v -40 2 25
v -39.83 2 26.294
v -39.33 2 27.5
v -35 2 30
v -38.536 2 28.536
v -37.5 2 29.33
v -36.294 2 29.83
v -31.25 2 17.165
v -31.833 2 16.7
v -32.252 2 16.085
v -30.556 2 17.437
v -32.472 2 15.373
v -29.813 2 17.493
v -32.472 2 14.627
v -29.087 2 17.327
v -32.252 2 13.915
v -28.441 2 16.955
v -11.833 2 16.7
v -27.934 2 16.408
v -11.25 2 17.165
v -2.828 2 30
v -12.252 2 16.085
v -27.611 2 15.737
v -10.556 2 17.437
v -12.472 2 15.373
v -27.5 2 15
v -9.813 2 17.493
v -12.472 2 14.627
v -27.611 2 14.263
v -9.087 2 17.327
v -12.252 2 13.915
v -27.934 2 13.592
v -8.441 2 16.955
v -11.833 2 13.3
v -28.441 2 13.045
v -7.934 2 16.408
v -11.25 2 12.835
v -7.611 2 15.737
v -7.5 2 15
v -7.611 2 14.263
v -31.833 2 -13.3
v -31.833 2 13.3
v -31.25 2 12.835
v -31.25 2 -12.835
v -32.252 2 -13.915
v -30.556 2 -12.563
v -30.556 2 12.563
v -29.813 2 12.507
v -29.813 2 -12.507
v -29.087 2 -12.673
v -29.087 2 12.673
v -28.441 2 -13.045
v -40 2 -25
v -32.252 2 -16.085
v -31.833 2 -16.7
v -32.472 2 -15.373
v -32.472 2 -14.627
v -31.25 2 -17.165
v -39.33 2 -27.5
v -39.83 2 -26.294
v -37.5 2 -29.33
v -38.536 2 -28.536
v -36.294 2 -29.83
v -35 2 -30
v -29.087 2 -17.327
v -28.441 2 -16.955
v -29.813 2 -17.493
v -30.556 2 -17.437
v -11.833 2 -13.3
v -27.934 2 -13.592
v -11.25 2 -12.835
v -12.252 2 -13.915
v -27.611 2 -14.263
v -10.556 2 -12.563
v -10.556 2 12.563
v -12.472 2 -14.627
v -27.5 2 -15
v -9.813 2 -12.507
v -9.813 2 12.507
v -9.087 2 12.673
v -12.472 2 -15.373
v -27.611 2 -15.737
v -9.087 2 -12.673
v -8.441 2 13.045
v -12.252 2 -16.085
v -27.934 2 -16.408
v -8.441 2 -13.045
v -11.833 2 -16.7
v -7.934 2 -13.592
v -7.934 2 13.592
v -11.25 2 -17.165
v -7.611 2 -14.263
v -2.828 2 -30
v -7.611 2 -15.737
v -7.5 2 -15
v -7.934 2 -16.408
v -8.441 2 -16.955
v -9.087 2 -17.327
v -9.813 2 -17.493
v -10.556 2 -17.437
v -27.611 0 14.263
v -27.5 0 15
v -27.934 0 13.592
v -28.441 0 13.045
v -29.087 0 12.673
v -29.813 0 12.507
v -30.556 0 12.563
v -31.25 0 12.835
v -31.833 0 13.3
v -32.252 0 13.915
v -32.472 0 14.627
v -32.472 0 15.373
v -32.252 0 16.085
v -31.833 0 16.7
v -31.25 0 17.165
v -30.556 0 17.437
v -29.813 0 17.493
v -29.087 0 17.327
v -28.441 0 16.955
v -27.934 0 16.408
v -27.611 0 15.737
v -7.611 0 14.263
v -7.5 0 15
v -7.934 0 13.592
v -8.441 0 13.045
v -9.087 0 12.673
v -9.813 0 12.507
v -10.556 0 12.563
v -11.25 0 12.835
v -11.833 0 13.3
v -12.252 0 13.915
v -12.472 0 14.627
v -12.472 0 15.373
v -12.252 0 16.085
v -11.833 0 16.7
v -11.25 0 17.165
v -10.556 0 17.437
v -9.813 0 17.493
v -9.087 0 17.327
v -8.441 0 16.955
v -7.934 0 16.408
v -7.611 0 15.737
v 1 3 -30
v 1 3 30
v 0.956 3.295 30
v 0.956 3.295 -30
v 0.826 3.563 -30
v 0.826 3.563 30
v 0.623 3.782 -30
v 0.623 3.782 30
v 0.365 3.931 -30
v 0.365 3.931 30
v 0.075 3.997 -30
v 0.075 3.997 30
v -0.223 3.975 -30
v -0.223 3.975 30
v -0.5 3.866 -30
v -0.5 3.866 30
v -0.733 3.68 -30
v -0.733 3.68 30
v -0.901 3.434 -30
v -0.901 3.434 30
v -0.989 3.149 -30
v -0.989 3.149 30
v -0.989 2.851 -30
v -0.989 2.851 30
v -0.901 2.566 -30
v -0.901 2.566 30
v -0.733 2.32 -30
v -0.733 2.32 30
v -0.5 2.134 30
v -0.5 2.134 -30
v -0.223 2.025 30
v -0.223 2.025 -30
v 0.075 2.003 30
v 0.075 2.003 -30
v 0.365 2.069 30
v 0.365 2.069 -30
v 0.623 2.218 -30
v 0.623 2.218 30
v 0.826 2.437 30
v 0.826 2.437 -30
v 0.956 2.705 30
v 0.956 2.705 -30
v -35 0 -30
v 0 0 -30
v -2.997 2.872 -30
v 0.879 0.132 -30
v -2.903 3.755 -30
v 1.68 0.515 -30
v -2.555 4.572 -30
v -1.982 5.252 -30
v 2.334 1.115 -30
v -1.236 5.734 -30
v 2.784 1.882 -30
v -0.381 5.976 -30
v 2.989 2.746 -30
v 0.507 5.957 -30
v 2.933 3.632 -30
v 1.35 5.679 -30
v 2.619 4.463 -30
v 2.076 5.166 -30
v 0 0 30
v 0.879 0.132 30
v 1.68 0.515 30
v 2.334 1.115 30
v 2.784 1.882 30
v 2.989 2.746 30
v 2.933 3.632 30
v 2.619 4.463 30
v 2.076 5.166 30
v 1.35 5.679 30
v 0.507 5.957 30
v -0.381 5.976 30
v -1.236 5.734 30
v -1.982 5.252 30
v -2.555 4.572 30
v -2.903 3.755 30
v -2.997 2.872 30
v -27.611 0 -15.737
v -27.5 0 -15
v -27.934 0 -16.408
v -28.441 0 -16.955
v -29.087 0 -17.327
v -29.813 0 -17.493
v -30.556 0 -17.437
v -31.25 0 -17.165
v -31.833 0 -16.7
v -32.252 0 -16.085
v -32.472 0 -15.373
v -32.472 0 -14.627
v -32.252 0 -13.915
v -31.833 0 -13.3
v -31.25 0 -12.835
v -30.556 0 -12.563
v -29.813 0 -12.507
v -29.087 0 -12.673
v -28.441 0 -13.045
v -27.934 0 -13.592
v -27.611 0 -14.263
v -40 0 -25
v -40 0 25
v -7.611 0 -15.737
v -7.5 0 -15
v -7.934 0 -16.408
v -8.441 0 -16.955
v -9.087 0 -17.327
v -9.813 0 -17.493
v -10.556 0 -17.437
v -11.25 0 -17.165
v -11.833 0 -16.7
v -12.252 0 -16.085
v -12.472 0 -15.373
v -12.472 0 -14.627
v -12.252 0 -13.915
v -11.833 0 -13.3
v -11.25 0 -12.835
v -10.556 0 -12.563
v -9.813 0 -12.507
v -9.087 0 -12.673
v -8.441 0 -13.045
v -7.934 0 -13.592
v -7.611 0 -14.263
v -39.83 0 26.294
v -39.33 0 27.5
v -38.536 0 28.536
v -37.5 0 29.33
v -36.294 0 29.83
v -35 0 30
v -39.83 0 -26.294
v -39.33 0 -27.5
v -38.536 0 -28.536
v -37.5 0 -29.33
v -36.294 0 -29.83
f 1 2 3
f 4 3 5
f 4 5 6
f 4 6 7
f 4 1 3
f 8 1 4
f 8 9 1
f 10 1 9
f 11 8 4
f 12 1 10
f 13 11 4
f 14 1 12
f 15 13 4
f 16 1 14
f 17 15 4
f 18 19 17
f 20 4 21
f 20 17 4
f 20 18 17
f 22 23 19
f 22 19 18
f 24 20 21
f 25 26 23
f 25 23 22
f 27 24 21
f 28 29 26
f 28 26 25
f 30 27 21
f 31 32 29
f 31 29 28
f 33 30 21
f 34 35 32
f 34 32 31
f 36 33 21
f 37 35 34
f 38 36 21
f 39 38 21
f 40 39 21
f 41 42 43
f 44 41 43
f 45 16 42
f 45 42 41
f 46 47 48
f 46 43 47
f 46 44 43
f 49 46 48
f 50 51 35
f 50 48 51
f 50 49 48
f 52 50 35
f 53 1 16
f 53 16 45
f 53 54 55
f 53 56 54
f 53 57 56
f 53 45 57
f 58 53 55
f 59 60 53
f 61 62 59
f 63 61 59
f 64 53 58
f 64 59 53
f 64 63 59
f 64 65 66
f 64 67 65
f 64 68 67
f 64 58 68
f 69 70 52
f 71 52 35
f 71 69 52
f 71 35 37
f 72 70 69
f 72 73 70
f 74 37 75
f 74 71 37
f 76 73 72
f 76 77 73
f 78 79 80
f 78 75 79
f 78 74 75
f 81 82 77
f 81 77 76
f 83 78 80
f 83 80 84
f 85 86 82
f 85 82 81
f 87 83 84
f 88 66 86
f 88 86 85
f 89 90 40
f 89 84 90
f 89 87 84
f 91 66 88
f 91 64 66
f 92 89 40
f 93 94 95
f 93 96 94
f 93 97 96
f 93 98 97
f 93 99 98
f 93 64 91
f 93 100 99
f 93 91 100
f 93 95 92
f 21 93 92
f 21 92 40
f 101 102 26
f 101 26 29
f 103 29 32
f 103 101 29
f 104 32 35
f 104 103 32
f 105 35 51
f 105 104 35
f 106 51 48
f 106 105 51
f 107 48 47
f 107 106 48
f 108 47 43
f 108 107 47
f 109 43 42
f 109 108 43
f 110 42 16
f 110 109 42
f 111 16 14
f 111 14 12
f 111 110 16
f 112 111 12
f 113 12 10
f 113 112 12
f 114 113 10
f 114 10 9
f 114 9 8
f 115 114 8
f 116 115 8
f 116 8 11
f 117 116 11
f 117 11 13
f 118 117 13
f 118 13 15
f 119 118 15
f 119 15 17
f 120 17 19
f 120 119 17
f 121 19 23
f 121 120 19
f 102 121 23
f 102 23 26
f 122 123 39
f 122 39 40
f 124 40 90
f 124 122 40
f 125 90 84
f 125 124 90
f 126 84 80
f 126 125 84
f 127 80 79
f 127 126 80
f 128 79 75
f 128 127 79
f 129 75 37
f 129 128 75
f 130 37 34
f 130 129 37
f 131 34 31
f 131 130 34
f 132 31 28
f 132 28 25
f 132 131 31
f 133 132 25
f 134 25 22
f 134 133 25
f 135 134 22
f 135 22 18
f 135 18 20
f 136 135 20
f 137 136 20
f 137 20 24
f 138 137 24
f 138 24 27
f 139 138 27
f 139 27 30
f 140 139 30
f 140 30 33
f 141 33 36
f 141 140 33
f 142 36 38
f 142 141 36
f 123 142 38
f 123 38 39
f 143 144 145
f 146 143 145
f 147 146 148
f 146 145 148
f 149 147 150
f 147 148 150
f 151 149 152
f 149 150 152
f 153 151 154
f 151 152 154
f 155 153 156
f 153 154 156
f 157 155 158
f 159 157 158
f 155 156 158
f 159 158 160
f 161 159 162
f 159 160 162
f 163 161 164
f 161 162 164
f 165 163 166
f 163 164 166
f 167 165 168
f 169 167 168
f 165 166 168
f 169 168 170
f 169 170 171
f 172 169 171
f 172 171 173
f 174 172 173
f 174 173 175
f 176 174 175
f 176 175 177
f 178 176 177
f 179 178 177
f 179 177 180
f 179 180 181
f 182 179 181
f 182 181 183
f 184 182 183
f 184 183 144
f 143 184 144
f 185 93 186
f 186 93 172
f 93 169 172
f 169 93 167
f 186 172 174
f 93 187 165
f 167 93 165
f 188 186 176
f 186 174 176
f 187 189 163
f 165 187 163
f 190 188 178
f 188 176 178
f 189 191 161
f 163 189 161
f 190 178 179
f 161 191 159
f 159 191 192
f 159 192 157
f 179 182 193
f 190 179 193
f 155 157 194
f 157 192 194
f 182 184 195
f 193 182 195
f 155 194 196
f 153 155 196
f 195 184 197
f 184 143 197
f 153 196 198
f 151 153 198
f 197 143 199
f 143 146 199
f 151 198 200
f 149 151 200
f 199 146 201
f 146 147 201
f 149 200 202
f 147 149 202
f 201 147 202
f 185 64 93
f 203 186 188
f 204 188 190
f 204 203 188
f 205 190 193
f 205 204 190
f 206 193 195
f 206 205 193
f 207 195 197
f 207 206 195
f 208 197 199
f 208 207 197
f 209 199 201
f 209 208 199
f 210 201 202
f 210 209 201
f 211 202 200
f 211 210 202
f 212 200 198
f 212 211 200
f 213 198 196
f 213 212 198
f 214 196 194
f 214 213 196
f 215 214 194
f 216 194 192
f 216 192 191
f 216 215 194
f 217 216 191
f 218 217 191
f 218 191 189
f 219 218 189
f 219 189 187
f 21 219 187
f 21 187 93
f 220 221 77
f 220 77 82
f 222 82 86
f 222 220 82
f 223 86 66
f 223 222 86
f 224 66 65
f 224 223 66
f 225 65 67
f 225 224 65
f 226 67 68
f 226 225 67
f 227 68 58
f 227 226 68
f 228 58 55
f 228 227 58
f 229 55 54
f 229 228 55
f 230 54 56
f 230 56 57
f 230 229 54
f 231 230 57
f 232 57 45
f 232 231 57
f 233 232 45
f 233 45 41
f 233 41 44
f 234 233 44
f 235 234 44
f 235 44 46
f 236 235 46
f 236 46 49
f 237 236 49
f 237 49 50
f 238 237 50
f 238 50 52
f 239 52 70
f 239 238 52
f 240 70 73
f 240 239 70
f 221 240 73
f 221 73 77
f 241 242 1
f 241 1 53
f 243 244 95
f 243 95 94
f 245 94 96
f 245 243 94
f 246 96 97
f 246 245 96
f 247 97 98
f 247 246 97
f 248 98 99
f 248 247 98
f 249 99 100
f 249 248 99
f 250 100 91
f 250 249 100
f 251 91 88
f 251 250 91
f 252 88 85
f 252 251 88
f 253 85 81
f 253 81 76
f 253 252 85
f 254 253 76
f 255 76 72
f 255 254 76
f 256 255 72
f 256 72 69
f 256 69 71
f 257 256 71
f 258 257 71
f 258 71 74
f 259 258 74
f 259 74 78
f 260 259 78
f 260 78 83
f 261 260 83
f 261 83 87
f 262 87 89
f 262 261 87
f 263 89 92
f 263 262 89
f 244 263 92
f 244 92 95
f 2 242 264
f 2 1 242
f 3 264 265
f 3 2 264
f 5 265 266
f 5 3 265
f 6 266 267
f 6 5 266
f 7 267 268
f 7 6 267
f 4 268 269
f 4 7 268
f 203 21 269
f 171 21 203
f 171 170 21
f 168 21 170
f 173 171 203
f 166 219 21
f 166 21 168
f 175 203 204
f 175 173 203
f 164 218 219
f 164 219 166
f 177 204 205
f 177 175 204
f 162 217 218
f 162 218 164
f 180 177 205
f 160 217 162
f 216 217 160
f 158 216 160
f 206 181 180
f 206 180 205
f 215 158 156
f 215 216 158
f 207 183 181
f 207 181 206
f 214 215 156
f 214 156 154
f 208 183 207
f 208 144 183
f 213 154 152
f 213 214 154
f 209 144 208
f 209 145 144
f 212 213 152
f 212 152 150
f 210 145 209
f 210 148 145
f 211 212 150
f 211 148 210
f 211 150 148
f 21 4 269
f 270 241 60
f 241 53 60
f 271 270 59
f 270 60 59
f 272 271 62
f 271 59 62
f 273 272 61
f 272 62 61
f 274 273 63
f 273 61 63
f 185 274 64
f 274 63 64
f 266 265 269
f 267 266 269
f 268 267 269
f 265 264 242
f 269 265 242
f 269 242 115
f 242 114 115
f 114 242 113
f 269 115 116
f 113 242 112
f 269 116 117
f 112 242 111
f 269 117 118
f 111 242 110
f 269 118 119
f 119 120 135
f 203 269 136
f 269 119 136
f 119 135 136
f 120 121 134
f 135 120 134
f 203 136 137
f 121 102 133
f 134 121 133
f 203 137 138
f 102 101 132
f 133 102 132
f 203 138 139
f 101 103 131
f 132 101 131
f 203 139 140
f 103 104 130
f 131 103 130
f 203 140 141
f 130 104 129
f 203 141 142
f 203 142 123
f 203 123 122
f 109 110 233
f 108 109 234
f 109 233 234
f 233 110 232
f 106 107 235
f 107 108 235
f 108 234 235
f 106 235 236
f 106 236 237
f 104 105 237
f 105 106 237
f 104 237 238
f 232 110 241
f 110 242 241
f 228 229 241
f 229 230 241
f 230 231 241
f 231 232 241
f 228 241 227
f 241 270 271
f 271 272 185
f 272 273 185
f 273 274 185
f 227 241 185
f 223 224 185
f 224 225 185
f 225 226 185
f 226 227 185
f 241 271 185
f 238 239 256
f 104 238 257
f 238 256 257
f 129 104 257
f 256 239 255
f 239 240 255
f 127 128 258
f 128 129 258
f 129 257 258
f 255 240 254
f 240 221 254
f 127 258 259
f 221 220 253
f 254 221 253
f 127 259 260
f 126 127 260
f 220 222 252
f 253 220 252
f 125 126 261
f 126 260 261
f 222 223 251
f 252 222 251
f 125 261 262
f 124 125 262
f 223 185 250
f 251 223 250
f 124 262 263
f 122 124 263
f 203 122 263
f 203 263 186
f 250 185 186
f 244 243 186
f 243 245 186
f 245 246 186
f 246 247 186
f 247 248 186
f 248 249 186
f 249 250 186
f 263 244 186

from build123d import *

# Parameters (mm, degrees)
SKETCH1_W           = 40
SKETCH1_H           = 60
SKETCH1_R           = 2.5
BOSS_EXTRUDE1_DEPTH = 2
FILLET1_R           = 5
SKETCH2_R           = 3
SKETCH2_R_2         = 1
BOSS_EXTRUDE2_DEPTH = 60


with BuildPart() as part:
    # Sketch1 → Boss-Extrude1 (new body)
    with BuildSketch(Plane(origin=(0, 0, 0), x_dir=(1, 0, 0), z_dir=(0, 1, 0))):
        with Locations((-20, 0)):
            Rectangle(SKETCH1_W, SKETCH1_H)
        with Locations((-30, 15)):
            Circle(SKETCH1_R, mode=Mode.SUBTRACT)
        with Locations((-10, 15)):
            Circle(SKETCH1_R, mode=Mode.SUBTRACT)
        with Locations((-10, -15)):
            Circle(SKETCH1_R, mode=Mode.SUBTRACT)
        with Locations((-30, -15)):
            Circle(SKETCH1_R, mode=Mode.SUBTRACT)
    extrude(amount=BOSS_EXTRUDE1_DEPTH)

    # Fillet1
    fillet1_edges = [part.edges().sort_by_distance(p)[0] for p in [
        (-40, 1, 30),
        (-40, 1, -30),
    ]]
    fillet(fillet1_edges, radius=FILLET1_R)

    # Sketch2 → Boss-Extrude2 (add)
    with BuildSketch(Plane.XY.offset(30)):
        with Locations((0, 3)):
            Circle(SKETCH2_R)
        with Locations((0, 3)):
            Circle(SKETCH2_R_2, mode=Mode.SUBTRACT)
    extrude(amount=-BOSS_EXTRUDE2_DEPTH)


solid = part.part
